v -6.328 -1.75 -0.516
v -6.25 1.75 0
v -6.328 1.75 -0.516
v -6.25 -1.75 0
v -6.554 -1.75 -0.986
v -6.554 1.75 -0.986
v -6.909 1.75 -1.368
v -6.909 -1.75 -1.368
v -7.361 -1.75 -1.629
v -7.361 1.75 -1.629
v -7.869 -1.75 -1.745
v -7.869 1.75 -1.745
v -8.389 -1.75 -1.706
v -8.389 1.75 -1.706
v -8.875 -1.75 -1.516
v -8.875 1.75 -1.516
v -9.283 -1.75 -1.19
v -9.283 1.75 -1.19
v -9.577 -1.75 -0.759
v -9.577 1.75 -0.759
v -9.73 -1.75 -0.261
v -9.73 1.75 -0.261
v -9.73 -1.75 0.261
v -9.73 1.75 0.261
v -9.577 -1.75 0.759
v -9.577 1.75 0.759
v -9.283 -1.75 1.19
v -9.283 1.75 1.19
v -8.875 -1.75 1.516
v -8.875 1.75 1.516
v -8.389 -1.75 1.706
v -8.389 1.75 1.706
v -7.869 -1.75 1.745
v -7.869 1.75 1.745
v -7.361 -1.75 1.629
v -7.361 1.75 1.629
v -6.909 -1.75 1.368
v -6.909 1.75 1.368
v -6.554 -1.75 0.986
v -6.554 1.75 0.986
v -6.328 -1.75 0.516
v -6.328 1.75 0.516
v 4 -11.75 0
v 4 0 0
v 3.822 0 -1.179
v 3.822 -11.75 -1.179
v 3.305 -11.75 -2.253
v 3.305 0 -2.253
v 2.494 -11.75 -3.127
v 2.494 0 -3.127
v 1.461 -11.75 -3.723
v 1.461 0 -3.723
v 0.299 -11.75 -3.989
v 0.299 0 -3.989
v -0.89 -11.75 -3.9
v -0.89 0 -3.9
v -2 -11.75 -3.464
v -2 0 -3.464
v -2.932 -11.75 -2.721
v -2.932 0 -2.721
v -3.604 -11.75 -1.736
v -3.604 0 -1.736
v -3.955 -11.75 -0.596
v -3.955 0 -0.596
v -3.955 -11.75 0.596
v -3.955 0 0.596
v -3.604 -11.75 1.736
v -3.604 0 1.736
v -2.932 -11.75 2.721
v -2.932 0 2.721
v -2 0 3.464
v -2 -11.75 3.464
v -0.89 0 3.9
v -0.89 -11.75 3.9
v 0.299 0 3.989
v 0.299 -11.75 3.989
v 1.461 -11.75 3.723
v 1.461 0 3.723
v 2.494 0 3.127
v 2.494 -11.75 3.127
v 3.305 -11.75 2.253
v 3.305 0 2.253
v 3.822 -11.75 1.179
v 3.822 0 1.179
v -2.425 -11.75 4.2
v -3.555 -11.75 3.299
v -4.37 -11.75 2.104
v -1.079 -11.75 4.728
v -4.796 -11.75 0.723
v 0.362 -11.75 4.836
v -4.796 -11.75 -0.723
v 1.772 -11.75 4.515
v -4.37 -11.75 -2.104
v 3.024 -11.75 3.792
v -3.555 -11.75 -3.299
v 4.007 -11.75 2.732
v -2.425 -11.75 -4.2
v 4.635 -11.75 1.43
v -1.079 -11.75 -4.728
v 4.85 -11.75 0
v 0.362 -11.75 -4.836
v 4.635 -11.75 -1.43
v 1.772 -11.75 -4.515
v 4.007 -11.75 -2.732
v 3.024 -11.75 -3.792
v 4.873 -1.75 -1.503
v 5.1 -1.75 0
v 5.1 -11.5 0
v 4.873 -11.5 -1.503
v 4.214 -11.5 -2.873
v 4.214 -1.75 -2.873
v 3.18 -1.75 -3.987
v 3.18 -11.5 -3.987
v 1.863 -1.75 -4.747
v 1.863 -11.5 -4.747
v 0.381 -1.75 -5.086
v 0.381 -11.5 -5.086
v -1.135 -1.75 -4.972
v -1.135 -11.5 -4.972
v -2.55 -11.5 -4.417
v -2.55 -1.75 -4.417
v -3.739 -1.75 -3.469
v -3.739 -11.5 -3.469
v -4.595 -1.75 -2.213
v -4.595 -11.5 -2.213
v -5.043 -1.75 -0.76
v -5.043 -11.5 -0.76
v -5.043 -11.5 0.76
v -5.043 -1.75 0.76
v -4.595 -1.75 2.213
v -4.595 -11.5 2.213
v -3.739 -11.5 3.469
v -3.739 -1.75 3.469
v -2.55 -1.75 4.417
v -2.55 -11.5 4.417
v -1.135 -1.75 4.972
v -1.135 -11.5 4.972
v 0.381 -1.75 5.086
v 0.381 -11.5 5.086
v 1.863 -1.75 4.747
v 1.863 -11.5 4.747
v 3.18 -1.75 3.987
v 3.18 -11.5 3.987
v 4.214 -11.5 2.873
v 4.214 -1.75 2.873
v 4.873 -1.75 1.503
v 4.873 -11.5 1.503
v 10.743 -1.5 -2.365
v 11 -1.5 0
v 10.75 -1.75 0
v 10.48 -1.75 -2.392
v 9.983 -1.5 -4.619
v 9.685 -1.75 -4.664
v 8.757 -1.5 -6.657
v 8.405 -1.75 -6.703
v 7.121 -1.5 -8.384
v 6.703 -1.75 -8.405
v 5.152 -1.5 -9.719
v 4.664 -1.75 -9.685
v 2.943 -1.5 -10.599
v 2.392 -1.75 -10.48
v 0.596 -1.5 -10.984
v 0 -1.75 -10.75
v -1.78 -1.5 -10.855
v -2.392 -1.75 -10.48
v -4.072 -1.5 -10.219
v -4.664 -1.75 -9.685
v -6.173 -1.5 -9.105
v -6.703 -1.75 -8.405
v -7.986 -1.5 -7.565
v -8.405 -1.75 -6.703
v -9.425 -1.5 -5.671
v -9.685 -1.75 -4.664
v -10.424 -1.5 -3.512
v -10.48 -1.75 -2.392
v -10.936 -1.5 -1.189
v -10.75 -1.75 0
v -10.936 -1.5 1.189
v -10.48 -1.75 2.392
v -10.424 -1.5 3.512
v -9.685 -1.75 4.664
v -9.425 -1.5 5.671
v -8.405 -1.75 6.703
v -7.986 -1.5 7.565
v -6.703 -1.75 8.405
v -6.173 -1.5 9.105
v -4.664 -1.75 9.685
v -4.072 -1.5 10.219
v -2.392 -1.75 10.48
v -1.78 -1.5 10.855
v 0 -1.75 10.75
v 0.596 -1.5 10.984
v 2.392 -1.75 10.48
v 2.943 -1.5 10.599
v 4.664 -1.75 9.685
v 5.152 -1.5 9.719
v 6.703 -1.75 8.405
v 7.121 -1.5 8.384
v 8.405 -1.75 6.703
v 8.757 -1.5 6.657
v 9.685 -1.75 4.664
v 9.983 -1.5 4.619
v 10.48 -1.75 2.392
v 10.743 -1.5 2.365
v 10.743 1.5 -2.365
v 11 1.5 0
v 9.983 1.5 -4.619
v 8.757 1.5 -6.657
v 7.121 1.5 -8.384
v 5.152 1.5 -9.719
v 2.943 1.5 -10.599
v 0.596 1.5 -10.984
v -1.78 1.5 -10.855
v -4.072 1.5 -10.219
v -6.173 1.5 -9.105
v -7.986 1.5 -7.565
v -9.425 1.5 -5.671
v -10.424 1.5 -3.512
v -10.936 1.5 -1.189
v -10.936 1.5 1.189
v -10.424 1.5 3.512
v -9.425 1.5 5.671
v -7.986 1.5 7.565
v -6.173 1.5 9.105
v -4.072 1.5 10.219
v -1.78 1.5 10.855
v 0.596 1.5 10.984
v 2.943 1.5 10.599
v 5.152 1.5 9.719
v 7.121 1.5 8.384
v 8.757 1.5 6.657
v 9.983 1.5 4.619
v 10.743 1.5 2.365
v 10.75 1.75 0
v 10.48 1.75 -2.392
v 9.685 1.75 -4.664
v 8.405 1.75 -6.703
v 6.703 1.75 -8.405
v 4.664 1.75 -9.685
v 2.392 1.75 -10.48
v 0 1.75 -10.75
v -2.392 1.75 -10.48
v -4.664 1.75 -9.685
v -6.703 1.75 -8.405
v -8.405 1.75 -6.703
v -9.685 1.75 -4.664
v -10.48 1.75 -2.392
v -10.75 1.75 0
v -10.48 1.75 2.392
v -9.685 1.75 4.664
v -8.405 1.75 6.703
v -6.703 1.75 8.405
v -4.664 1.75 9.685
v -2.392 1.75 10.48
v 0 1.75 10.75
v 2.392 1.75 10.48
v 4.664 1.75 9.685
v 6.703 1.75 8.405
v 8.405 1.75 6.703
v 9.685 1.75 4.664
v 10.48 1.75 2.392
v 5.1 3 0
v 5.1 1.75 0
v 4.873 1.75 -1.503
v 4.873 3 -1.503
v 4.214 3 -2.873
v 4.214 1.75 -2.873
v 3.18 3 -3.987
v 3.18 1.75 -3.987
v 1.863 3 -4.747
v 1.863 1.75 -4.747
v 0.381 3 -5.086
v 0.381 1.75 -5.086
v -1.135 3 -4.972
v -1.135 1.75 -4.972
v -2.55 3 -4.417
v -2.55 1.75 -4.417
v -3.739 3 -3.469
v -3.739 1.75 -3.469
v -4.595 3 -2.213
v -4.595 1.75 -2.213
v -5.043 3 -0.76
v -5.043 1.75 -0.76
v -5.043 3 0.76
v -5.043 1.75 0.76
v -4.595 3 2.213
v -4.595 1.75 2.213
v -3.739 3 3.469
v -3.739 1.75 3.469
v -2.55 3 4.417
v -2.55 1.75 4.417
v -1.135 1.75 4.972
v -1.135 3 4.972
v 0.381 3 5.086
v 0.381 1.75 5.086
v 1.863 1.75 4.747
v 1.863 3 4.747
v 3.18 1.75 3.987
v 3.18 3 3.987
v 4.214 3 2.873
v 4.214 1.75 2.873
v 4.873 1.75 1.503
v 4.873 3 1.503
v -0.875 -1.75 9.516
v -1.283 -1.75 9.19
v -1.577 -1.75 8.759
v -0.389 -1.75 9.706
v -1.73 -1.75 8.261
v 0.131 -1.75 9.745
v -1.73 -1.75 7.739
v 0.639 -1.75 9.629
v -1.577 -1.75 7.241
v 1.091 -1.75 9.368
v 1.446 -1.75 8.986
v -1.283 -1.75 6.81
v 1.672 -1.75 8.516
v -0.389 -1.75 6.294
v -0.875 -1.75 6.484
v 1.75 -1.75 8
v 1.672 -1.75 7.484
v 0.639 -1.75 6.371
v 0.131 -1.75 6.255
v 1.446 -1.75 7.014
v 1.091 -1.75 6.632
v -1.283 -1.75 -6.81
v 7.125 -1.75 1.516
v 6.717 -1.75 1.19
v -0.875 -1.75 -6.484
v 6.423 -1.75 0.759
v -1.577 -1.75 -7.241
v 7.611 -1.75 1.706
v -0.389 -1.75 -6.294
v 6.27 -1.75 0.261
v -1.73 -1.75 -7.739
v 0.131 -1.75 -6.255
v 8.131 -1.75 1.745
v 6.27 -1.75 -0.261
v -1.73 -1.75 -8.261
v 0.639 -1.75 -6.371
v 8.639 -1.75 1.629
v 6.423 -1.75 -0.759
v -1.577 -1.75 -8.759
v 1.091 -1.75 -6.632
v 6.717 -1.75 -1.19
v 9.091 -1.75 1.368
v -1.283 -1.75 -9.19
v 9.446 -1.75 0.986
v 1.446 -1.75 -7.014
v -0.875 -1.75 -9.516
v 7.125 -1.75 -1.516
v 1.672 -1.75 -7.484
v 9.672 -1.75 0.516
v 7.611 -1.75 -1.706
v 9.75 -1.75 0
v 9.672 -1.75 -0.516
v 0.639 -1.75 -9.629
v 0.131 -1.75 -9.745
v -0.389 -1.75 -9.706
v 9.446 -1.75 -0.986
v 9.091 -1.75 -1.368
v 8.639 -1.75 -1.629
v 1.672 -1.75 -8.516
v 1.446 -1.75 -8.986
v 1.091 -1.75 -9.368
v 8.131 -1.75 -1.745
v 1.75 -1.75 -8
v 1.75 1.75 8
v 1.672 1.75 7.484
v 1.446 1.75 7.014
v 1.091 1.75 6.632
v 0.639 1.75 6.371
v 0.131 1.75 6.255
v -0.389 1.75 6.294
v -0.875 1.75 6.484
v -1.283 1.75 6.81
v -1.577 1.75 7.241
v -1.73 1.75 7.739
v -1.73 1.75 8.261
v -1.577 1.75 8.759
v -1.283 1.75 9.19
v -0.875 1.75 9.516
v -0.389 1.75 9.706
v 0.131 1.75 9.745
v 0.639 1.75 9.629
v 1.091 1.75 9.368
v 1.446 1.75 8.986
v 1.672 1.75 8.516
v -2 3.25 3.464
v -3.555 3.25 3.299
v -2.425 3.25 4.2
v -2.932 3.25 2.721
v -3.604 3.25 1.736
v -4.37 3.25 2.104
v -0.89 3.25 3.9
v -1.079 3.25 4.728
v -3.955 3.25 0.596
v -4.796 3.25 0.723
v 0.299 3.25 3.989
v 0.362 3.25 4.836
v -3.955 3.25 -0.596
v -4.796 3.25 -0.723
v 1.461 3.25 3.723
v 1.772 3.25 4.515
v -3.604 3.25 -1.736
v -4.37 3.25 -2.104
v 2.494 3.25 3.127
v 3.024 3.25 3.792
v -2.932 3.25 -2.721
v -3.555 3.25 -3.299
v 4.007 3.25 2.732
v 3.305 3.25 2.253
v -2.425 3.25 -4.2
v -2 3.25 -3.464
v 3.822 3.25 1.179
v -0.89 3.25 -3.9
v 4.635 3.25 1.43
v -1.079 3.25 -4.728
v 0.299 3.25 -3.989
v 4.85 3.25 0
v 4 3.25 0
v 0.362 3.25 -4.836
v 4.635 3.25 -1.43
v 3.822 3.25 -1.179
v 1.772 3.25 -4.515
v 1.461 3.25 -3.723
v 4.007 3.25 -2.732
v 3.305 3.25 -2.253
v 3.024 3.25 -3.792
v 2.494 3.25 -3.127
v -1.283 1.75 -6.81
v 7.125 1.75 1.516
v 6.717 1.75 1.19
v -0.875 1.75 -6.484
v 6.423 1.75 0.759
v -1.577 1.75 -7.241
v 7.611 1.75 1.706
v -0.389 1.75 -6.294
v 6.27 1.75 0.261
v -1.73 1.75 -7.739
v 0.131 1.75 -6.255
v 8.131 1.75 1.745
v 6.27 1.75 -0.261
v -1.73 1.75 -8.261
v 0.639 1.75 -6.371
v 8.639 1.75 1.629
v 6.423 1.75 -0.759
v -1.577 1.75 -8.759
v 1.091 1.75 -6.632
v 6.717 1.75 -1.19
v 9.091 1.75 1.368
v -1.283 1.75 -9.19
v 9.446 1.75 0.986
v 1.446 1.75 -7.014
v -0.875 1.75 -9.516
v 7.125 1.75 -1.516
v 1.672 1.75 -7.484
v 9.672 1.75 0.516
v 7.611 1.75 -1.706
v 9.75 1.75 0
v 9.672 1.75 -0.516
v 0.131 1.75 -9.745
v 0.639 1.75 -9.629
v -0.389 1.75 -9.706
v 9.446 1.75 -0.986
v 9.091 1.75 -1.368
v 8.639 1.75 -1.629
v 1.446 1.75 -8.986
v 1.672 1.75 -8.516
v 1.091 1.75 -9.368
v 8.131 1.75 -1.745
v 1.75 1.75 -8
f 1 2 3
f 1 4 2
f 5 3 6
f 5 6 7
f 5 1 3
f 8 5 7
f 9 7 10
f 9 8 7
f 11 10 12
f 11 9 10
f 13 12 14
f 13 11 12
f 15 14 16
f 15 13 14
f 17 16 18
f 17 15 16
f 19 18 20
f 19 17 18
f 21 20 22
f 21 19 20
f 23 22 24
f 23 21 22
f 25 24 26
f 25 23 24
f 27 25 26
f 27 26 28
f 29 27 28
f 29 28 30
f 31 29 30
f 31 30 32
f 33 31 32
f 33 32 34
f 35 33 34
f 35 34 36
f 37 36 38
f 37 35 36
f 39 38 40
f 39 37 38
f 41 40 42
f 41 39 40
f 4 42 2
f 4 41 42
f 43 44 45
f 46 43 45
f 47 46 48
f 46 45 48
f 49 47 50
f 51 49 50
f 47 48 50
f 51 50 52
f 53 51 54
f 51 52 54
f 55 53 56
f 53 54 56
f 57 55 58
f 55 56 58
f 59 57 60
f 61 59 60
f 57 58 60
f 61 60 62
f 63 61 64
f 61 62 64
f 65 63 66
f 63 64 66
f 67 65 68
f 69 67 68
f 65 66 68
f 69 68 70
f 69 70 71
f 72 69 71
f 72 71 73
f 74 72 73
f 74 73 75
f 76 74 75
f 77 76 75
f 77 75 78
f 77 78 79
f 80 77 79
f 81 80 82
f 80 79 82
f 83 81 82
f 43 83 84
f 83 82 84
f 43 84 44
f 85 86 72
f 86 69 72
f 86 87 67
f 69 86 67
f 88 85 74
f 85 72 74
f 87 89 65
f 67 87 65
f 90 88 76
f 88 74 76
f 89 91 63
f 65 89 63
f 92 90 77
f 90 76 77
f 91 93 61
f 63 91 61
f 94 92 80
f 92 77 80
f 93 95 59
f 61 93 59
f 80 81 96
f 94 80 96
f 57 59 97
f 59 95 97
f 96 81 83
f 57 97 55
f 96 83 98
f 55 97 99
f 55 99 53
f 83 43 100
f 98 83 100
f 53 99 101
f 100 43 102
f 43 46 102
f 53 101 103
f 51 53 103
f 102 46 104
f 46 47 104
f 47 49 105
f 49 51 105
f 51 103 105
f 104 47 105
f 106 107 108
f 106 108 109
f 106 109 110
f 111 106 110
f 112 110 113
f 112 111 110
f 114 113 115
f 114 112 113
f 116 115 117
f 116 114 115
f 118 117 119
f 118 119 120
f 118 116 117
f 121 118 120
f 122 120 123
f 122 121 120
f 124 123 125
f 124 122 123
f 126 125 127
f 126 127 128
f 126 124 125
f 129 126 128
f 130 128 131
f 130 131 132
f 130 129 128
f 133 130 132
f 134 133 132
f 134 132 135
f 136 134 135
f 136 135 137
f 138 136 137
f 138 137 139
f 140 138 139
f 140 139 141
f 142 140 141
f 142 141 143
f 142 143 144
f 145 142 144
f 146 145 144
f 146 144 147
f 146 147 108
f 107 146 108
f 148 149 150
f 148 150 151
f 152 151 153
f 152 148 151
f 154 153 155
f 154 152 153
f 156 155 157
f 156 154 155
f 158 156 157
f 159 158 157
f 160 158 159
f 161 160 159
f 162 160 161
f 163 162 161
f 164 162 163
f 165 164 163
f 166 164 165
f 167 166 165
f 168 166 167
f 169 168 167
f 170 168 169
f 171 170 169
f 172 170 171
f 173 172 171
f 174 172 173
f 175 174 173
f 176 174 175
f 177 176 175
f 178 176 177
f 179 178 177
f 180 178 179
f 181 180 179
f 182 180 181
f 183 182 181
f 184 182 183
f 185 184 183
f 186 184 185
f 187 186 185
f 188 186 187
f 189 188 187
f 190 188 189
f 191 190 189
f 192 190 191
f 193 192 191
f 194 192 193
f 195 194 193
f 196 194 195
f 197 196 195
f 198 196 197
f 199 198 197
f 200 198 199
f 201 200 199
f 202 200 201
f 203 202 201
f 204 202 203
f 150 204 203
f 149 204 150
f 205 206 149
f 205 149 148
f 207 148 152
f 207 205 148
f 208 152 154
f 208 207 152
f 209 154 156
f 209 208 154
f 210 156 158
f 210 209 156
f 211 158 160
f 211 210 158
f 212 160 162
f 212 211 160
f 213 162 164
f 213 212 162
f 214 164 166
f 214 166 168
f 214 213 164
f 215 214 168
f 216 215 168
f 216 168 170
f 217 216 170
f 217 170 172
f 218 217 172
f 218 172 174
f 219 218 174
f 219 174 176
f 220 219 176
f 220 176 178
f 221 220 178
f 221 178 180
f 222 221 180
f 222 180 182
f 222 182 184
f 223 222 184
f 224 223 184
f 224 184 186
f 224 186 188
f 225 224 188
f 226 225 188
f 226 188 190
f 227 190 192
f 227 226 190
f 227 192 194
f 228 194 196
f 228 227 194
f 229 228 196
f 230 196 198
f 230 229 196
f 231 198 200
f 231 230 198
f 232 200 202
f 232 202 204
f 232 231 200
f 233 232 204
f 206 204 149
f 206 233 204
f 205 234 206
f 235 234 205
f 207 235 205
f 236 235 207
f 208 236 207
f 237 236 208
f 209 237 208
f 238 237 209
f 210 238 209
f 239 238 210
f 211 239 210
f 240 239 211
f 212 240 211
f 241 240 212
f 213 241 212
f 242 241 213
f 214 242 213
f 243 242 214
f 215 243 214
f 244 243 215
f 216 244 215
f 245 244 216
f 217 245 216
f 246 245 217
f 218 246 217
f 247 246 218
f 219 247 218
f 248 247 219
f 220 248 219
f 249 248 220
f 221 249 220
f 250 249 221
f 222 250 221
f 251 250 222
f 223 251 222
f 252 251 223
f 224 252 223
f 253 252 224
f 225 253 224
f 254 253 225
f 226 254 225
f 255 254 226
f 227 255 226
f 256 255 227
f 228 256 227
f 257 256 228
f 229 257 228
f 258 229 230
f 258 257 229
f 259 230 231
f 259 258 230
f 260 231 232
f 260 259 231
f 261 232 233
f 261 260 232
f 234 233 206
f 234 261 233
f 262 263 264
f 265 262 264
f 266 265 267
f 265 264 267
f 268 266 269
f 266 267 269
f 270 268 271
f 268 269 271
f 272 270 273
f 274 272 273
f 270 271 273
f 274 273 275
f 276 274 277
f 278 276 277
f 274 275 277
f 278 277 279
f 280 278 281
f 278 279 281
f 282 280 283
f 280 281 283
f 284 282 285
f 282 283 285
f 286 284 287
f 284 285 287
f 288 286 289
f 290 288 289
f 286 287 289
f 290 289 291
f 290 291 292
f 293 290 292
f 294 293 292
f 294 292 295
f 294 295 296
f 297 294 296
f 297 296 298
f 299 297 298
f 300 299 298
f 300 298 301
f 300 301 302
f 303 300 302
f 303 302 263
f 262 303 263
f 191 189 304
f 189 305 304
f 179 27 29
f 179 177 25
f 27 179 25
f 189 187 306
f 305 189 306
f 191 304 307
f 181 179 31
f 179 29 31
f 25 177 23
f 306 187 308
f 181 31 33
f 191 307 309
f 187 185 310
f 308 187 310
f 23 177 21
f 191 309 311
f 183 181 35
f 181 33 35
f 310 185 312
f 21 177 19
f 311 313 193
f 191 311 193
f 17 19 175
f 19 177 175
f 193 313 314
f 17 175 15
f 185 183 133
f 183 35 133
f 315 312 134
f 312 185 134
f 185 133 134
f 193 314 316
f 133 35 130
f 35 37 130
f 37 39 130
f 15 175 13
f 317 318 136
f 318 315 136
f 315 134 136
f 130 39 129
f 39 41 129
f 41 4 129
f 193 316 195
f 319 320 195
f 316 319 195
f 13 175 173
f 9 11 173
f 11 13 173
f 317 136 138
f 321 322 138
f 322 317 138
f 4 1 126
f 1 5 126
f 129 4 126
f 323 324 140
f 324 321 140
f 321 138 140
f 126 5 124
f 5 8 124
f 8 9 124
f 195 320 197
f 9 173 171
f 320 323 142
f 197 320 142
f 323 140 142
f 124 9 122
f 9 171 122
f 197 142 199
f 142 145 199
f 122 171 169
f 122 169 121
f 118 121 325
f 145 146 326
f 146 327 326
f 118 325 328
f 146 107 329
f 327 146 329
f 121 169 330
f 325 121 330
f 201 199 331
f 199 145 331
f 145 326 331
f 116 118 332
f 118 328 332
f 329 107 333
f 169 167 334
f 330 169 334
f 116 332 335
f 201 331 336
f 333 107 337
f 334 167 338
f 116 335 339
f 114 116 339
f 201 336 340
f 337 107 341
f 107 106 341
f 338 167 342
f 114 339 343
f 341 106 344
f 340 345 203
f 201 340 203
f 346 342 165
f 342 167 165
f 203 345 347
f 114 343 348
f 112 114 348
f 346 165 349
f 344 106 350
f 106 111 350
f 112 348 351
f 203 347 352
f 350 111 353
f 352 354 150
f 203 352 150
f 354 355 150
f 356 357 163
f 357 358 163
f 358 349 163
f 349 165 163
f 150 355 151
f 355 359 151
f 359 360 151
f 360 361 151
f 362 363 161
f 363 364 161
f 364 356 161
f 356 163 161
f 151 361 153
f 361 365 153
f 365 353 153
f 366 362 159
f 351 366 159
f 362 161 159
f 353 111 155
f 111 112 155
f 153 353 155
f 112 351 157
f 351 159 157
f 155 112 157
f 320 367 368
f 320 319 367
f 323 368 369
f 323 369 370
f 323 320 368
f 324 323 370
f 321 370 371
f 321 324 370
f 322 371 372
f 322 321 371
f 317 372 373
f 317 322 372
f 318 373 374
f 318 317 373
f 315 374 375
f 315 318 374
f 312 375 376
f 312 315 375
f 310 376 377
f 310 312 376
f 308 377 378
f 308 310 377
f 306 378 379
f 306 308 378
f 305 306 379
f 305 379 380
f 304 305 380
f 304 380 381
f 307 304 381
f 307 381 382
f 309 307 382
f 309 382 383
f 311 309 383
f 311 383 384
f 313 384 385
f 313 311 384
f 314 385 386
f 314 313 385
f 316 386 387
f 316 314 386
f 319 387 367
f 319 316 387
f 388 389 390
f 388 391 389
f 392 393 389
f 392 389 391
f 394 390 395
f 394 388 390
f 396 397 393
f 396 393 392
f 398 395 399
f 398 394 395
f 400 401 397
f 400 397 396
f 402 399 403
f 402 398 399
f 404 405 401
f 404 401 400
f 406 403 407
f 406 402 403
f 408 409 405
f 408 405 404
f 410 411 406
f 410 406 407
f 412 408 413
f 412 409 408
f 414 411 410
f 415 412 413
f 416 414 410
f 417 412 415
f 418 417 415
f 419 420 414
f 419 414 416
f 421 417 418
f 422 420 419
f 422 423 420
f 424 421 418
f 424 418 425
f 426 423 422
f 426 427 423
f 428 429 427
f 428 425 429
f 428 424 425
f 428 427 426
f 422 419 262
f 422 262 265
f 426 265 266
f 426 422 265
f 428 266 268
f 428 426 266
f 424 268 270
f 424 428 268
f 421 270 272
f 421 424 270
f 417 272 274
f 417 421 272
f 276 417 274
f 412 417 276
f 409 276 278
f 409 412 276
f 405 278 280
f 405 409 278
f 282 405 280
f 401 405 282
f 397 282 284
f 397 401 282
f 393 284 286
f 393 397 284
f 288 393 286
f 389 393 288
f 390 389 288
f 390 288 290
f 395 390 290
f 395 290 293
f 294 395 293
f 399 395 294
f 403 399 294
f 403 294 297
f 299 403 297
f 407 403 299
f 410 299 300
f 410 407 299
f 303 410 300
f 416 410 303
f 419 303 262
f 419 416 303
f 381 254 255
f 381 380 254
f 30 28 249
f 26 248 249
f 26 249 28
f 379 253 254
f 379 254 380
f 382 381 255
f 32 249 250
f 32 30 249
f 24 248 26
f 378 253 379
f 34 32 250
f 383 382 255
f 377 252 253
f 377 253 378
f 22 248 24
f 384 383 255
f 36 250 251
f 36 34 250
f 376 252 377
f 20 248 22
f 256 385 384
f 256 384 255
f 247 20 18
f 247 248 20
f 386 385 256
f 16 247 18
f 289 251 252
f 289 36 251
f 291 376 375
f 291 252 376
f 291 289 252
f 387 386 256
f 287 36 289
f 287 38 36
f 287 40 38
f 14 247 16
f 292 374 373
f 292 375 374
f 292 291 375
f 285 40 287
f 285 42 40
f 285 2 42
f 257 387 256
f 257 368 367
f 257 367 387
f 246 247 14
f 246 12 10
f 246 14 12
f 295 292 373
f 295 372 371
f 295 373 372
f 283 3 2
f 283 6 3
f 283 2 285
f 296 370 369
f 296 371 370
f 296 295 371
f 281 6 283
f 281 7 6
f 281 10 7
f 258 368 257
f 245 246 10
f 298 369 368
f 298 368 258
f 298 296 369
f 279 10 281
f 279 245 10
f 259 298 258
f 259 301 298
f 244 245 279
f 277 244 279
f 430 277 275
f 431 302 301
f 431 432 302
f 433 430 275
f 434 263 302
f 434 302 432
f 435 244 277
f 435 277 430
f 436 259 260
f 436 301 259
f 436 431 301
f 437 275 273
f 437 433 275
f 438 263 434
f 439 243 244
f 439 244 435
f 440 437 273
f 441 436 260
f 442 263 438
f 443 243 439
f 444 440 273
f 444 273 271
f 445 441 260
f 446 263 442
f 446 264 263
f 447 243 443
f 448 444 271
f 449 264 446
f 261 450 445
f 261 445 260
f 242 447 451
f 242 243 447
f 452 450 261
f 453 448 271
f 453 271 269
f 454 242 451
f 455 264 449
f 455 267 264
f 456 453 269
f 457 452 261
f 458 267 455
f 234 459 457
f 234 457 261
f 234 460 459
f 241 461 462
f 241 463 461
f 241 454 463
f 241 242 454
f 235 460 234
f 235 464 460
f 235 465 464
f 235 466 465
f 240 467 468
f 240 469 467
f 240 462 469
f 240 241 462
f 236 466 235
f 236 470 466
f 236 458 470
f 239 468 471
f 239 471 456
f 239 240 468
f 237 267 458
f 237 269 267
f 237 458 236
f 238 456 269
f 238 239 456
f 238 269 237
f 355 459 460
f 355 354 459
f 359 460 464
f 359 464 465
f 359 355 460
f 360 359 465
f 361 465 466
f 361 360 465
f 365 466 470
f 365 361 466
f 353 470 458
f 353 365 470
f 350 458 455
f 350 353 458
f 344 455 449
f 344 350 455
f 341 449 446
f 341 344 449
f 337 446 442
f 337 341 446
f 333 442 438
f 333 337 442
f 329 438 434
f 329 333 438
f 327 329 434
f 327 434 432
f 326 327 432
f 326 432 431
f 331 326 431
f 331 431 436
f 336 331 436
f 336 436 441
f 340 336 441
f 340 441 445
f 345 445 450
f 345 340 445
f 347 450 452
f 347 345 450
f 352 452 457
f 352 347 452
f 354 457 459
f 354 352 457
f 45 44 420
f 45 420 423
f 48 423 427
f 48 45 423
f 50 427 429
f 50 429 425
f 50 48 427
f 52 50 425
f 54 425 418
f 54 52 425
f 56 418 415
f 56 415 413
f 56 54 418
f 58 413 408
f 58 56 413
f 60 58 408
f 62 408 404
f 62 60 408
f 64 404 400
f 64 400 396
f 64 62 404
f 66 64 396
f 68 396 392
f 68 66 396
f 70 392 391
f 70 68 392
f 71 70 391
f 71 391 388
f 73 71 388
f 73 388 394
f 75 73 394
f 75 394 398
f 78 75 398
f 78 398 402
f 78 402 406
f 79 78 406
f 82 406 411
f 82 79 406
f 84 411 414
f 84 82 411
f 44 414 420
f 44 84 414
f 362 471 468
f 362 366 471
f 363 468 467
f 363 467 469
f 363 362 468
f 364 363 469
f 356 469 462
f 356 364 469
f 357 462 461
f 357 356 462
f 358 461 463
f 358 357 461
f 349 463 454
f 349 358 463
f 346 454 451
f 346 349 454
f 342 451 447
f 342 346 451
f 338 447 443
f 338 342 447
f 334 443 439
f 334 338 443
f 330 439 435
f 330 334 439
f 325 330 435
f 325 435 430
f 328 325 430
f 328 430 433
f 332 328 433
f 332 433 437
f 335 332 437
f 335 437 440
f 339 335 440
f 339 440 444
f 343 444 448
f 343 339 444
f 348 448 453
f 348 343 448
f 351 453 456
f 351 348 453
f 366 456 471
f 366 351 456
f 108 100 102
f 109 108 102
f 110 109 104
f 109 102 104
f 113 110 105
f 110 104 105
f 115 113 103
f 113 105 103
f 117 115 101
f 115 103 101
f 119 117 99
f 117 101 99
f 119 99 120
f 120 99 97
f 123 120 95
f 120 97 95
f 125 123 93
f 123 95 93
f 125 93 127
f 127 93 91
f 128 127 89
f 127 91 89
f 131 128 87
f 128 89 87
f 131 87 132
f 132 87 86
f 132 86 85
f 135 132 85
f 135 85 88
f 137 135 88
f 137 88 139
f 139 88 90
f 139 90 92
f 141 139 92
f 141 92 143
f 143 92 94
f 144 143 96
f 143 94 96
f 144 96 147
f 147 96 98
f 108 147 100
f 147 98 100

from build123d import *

# Parameters (mm, degrees)
SKETCH1_R                = 11
SKETCH1_R_2              = 5.1
SKETCH1_R_3              = 1.75
BOSS_EXTRUDE1_DEPTH      = 1.75
BOSS_EXTRUDE2_DEPTH      = 3.25
BOSS_EXTRUDE2_DEPTH_BACK = 11.75
SKETCH1_3_R              = 5.1
SKETCH1_3_R_2            = 4
CHAMFER1_SIZE            = 0.25


with BuildPart() as part:
    # Sketch1 → Boss-Extrude1 (new, symmetric)
    with BuildSketch(Plane(origin=(0, 0, 0), x_dir=(1, 0, 0), z_dir=(0, 1, 0))):
        Circle(SKETCH1_R)
        Circle(SKETCH1_R_2, mode=Mode.SUBTRACT)
        with Locations((0, 8)):
            Circle(SKETCH1_R_3, mode=Mode.SUBTRACT)
        with Locations((8, 0)):
            Circle(SKETCH1_R_3, mode=Mode.SUBTRACT)
        with Locations((0, -8)):
            Circle(SKETCH1_R_3, mode=Mode.SUBTRACT)
        with Locations((-8, 0)):
            Circle(SKETCH1_R_3, mode=Mode.SUBTRACT)
    extrude(amount=BOSS_EXTRUDE1_DEPTH, both=True)

    # Sketch1<3> → Boss-Extrude2 (add, two sides: drawn at the far end of the back side and taken through both)
    with BuildSketch(Plane(origin=(0, 0, 0), x_dir=(1, 0, 0), z_dir=(0, 1, 0)).offset(-BOSS_EXTRUDE2_DEPTH_BACK)):
        Circle(SKETCH1_3_R)
        Circle(SKETCH1_3_R_2, mode=Mode.SUBTRACT)
    extrude(amount=BOSS_EXTRUDE2_DEPTH + BOSS_EXTRUDE2_DEPTH_BACK)

    # Chamfer1
    chamfer1_edges = [part.edges().sort_by_distance(p)[0] for p in [
        (-5.1, -11.75, 0),
        (-11, -1.75, 0),
        (-11, 1.75, 0),
        (-5.1, 3.25, 0),
    ]]
    chamfer(chamfer1_edges, length=CHAMFER1_SIZE)


solid = part.part
